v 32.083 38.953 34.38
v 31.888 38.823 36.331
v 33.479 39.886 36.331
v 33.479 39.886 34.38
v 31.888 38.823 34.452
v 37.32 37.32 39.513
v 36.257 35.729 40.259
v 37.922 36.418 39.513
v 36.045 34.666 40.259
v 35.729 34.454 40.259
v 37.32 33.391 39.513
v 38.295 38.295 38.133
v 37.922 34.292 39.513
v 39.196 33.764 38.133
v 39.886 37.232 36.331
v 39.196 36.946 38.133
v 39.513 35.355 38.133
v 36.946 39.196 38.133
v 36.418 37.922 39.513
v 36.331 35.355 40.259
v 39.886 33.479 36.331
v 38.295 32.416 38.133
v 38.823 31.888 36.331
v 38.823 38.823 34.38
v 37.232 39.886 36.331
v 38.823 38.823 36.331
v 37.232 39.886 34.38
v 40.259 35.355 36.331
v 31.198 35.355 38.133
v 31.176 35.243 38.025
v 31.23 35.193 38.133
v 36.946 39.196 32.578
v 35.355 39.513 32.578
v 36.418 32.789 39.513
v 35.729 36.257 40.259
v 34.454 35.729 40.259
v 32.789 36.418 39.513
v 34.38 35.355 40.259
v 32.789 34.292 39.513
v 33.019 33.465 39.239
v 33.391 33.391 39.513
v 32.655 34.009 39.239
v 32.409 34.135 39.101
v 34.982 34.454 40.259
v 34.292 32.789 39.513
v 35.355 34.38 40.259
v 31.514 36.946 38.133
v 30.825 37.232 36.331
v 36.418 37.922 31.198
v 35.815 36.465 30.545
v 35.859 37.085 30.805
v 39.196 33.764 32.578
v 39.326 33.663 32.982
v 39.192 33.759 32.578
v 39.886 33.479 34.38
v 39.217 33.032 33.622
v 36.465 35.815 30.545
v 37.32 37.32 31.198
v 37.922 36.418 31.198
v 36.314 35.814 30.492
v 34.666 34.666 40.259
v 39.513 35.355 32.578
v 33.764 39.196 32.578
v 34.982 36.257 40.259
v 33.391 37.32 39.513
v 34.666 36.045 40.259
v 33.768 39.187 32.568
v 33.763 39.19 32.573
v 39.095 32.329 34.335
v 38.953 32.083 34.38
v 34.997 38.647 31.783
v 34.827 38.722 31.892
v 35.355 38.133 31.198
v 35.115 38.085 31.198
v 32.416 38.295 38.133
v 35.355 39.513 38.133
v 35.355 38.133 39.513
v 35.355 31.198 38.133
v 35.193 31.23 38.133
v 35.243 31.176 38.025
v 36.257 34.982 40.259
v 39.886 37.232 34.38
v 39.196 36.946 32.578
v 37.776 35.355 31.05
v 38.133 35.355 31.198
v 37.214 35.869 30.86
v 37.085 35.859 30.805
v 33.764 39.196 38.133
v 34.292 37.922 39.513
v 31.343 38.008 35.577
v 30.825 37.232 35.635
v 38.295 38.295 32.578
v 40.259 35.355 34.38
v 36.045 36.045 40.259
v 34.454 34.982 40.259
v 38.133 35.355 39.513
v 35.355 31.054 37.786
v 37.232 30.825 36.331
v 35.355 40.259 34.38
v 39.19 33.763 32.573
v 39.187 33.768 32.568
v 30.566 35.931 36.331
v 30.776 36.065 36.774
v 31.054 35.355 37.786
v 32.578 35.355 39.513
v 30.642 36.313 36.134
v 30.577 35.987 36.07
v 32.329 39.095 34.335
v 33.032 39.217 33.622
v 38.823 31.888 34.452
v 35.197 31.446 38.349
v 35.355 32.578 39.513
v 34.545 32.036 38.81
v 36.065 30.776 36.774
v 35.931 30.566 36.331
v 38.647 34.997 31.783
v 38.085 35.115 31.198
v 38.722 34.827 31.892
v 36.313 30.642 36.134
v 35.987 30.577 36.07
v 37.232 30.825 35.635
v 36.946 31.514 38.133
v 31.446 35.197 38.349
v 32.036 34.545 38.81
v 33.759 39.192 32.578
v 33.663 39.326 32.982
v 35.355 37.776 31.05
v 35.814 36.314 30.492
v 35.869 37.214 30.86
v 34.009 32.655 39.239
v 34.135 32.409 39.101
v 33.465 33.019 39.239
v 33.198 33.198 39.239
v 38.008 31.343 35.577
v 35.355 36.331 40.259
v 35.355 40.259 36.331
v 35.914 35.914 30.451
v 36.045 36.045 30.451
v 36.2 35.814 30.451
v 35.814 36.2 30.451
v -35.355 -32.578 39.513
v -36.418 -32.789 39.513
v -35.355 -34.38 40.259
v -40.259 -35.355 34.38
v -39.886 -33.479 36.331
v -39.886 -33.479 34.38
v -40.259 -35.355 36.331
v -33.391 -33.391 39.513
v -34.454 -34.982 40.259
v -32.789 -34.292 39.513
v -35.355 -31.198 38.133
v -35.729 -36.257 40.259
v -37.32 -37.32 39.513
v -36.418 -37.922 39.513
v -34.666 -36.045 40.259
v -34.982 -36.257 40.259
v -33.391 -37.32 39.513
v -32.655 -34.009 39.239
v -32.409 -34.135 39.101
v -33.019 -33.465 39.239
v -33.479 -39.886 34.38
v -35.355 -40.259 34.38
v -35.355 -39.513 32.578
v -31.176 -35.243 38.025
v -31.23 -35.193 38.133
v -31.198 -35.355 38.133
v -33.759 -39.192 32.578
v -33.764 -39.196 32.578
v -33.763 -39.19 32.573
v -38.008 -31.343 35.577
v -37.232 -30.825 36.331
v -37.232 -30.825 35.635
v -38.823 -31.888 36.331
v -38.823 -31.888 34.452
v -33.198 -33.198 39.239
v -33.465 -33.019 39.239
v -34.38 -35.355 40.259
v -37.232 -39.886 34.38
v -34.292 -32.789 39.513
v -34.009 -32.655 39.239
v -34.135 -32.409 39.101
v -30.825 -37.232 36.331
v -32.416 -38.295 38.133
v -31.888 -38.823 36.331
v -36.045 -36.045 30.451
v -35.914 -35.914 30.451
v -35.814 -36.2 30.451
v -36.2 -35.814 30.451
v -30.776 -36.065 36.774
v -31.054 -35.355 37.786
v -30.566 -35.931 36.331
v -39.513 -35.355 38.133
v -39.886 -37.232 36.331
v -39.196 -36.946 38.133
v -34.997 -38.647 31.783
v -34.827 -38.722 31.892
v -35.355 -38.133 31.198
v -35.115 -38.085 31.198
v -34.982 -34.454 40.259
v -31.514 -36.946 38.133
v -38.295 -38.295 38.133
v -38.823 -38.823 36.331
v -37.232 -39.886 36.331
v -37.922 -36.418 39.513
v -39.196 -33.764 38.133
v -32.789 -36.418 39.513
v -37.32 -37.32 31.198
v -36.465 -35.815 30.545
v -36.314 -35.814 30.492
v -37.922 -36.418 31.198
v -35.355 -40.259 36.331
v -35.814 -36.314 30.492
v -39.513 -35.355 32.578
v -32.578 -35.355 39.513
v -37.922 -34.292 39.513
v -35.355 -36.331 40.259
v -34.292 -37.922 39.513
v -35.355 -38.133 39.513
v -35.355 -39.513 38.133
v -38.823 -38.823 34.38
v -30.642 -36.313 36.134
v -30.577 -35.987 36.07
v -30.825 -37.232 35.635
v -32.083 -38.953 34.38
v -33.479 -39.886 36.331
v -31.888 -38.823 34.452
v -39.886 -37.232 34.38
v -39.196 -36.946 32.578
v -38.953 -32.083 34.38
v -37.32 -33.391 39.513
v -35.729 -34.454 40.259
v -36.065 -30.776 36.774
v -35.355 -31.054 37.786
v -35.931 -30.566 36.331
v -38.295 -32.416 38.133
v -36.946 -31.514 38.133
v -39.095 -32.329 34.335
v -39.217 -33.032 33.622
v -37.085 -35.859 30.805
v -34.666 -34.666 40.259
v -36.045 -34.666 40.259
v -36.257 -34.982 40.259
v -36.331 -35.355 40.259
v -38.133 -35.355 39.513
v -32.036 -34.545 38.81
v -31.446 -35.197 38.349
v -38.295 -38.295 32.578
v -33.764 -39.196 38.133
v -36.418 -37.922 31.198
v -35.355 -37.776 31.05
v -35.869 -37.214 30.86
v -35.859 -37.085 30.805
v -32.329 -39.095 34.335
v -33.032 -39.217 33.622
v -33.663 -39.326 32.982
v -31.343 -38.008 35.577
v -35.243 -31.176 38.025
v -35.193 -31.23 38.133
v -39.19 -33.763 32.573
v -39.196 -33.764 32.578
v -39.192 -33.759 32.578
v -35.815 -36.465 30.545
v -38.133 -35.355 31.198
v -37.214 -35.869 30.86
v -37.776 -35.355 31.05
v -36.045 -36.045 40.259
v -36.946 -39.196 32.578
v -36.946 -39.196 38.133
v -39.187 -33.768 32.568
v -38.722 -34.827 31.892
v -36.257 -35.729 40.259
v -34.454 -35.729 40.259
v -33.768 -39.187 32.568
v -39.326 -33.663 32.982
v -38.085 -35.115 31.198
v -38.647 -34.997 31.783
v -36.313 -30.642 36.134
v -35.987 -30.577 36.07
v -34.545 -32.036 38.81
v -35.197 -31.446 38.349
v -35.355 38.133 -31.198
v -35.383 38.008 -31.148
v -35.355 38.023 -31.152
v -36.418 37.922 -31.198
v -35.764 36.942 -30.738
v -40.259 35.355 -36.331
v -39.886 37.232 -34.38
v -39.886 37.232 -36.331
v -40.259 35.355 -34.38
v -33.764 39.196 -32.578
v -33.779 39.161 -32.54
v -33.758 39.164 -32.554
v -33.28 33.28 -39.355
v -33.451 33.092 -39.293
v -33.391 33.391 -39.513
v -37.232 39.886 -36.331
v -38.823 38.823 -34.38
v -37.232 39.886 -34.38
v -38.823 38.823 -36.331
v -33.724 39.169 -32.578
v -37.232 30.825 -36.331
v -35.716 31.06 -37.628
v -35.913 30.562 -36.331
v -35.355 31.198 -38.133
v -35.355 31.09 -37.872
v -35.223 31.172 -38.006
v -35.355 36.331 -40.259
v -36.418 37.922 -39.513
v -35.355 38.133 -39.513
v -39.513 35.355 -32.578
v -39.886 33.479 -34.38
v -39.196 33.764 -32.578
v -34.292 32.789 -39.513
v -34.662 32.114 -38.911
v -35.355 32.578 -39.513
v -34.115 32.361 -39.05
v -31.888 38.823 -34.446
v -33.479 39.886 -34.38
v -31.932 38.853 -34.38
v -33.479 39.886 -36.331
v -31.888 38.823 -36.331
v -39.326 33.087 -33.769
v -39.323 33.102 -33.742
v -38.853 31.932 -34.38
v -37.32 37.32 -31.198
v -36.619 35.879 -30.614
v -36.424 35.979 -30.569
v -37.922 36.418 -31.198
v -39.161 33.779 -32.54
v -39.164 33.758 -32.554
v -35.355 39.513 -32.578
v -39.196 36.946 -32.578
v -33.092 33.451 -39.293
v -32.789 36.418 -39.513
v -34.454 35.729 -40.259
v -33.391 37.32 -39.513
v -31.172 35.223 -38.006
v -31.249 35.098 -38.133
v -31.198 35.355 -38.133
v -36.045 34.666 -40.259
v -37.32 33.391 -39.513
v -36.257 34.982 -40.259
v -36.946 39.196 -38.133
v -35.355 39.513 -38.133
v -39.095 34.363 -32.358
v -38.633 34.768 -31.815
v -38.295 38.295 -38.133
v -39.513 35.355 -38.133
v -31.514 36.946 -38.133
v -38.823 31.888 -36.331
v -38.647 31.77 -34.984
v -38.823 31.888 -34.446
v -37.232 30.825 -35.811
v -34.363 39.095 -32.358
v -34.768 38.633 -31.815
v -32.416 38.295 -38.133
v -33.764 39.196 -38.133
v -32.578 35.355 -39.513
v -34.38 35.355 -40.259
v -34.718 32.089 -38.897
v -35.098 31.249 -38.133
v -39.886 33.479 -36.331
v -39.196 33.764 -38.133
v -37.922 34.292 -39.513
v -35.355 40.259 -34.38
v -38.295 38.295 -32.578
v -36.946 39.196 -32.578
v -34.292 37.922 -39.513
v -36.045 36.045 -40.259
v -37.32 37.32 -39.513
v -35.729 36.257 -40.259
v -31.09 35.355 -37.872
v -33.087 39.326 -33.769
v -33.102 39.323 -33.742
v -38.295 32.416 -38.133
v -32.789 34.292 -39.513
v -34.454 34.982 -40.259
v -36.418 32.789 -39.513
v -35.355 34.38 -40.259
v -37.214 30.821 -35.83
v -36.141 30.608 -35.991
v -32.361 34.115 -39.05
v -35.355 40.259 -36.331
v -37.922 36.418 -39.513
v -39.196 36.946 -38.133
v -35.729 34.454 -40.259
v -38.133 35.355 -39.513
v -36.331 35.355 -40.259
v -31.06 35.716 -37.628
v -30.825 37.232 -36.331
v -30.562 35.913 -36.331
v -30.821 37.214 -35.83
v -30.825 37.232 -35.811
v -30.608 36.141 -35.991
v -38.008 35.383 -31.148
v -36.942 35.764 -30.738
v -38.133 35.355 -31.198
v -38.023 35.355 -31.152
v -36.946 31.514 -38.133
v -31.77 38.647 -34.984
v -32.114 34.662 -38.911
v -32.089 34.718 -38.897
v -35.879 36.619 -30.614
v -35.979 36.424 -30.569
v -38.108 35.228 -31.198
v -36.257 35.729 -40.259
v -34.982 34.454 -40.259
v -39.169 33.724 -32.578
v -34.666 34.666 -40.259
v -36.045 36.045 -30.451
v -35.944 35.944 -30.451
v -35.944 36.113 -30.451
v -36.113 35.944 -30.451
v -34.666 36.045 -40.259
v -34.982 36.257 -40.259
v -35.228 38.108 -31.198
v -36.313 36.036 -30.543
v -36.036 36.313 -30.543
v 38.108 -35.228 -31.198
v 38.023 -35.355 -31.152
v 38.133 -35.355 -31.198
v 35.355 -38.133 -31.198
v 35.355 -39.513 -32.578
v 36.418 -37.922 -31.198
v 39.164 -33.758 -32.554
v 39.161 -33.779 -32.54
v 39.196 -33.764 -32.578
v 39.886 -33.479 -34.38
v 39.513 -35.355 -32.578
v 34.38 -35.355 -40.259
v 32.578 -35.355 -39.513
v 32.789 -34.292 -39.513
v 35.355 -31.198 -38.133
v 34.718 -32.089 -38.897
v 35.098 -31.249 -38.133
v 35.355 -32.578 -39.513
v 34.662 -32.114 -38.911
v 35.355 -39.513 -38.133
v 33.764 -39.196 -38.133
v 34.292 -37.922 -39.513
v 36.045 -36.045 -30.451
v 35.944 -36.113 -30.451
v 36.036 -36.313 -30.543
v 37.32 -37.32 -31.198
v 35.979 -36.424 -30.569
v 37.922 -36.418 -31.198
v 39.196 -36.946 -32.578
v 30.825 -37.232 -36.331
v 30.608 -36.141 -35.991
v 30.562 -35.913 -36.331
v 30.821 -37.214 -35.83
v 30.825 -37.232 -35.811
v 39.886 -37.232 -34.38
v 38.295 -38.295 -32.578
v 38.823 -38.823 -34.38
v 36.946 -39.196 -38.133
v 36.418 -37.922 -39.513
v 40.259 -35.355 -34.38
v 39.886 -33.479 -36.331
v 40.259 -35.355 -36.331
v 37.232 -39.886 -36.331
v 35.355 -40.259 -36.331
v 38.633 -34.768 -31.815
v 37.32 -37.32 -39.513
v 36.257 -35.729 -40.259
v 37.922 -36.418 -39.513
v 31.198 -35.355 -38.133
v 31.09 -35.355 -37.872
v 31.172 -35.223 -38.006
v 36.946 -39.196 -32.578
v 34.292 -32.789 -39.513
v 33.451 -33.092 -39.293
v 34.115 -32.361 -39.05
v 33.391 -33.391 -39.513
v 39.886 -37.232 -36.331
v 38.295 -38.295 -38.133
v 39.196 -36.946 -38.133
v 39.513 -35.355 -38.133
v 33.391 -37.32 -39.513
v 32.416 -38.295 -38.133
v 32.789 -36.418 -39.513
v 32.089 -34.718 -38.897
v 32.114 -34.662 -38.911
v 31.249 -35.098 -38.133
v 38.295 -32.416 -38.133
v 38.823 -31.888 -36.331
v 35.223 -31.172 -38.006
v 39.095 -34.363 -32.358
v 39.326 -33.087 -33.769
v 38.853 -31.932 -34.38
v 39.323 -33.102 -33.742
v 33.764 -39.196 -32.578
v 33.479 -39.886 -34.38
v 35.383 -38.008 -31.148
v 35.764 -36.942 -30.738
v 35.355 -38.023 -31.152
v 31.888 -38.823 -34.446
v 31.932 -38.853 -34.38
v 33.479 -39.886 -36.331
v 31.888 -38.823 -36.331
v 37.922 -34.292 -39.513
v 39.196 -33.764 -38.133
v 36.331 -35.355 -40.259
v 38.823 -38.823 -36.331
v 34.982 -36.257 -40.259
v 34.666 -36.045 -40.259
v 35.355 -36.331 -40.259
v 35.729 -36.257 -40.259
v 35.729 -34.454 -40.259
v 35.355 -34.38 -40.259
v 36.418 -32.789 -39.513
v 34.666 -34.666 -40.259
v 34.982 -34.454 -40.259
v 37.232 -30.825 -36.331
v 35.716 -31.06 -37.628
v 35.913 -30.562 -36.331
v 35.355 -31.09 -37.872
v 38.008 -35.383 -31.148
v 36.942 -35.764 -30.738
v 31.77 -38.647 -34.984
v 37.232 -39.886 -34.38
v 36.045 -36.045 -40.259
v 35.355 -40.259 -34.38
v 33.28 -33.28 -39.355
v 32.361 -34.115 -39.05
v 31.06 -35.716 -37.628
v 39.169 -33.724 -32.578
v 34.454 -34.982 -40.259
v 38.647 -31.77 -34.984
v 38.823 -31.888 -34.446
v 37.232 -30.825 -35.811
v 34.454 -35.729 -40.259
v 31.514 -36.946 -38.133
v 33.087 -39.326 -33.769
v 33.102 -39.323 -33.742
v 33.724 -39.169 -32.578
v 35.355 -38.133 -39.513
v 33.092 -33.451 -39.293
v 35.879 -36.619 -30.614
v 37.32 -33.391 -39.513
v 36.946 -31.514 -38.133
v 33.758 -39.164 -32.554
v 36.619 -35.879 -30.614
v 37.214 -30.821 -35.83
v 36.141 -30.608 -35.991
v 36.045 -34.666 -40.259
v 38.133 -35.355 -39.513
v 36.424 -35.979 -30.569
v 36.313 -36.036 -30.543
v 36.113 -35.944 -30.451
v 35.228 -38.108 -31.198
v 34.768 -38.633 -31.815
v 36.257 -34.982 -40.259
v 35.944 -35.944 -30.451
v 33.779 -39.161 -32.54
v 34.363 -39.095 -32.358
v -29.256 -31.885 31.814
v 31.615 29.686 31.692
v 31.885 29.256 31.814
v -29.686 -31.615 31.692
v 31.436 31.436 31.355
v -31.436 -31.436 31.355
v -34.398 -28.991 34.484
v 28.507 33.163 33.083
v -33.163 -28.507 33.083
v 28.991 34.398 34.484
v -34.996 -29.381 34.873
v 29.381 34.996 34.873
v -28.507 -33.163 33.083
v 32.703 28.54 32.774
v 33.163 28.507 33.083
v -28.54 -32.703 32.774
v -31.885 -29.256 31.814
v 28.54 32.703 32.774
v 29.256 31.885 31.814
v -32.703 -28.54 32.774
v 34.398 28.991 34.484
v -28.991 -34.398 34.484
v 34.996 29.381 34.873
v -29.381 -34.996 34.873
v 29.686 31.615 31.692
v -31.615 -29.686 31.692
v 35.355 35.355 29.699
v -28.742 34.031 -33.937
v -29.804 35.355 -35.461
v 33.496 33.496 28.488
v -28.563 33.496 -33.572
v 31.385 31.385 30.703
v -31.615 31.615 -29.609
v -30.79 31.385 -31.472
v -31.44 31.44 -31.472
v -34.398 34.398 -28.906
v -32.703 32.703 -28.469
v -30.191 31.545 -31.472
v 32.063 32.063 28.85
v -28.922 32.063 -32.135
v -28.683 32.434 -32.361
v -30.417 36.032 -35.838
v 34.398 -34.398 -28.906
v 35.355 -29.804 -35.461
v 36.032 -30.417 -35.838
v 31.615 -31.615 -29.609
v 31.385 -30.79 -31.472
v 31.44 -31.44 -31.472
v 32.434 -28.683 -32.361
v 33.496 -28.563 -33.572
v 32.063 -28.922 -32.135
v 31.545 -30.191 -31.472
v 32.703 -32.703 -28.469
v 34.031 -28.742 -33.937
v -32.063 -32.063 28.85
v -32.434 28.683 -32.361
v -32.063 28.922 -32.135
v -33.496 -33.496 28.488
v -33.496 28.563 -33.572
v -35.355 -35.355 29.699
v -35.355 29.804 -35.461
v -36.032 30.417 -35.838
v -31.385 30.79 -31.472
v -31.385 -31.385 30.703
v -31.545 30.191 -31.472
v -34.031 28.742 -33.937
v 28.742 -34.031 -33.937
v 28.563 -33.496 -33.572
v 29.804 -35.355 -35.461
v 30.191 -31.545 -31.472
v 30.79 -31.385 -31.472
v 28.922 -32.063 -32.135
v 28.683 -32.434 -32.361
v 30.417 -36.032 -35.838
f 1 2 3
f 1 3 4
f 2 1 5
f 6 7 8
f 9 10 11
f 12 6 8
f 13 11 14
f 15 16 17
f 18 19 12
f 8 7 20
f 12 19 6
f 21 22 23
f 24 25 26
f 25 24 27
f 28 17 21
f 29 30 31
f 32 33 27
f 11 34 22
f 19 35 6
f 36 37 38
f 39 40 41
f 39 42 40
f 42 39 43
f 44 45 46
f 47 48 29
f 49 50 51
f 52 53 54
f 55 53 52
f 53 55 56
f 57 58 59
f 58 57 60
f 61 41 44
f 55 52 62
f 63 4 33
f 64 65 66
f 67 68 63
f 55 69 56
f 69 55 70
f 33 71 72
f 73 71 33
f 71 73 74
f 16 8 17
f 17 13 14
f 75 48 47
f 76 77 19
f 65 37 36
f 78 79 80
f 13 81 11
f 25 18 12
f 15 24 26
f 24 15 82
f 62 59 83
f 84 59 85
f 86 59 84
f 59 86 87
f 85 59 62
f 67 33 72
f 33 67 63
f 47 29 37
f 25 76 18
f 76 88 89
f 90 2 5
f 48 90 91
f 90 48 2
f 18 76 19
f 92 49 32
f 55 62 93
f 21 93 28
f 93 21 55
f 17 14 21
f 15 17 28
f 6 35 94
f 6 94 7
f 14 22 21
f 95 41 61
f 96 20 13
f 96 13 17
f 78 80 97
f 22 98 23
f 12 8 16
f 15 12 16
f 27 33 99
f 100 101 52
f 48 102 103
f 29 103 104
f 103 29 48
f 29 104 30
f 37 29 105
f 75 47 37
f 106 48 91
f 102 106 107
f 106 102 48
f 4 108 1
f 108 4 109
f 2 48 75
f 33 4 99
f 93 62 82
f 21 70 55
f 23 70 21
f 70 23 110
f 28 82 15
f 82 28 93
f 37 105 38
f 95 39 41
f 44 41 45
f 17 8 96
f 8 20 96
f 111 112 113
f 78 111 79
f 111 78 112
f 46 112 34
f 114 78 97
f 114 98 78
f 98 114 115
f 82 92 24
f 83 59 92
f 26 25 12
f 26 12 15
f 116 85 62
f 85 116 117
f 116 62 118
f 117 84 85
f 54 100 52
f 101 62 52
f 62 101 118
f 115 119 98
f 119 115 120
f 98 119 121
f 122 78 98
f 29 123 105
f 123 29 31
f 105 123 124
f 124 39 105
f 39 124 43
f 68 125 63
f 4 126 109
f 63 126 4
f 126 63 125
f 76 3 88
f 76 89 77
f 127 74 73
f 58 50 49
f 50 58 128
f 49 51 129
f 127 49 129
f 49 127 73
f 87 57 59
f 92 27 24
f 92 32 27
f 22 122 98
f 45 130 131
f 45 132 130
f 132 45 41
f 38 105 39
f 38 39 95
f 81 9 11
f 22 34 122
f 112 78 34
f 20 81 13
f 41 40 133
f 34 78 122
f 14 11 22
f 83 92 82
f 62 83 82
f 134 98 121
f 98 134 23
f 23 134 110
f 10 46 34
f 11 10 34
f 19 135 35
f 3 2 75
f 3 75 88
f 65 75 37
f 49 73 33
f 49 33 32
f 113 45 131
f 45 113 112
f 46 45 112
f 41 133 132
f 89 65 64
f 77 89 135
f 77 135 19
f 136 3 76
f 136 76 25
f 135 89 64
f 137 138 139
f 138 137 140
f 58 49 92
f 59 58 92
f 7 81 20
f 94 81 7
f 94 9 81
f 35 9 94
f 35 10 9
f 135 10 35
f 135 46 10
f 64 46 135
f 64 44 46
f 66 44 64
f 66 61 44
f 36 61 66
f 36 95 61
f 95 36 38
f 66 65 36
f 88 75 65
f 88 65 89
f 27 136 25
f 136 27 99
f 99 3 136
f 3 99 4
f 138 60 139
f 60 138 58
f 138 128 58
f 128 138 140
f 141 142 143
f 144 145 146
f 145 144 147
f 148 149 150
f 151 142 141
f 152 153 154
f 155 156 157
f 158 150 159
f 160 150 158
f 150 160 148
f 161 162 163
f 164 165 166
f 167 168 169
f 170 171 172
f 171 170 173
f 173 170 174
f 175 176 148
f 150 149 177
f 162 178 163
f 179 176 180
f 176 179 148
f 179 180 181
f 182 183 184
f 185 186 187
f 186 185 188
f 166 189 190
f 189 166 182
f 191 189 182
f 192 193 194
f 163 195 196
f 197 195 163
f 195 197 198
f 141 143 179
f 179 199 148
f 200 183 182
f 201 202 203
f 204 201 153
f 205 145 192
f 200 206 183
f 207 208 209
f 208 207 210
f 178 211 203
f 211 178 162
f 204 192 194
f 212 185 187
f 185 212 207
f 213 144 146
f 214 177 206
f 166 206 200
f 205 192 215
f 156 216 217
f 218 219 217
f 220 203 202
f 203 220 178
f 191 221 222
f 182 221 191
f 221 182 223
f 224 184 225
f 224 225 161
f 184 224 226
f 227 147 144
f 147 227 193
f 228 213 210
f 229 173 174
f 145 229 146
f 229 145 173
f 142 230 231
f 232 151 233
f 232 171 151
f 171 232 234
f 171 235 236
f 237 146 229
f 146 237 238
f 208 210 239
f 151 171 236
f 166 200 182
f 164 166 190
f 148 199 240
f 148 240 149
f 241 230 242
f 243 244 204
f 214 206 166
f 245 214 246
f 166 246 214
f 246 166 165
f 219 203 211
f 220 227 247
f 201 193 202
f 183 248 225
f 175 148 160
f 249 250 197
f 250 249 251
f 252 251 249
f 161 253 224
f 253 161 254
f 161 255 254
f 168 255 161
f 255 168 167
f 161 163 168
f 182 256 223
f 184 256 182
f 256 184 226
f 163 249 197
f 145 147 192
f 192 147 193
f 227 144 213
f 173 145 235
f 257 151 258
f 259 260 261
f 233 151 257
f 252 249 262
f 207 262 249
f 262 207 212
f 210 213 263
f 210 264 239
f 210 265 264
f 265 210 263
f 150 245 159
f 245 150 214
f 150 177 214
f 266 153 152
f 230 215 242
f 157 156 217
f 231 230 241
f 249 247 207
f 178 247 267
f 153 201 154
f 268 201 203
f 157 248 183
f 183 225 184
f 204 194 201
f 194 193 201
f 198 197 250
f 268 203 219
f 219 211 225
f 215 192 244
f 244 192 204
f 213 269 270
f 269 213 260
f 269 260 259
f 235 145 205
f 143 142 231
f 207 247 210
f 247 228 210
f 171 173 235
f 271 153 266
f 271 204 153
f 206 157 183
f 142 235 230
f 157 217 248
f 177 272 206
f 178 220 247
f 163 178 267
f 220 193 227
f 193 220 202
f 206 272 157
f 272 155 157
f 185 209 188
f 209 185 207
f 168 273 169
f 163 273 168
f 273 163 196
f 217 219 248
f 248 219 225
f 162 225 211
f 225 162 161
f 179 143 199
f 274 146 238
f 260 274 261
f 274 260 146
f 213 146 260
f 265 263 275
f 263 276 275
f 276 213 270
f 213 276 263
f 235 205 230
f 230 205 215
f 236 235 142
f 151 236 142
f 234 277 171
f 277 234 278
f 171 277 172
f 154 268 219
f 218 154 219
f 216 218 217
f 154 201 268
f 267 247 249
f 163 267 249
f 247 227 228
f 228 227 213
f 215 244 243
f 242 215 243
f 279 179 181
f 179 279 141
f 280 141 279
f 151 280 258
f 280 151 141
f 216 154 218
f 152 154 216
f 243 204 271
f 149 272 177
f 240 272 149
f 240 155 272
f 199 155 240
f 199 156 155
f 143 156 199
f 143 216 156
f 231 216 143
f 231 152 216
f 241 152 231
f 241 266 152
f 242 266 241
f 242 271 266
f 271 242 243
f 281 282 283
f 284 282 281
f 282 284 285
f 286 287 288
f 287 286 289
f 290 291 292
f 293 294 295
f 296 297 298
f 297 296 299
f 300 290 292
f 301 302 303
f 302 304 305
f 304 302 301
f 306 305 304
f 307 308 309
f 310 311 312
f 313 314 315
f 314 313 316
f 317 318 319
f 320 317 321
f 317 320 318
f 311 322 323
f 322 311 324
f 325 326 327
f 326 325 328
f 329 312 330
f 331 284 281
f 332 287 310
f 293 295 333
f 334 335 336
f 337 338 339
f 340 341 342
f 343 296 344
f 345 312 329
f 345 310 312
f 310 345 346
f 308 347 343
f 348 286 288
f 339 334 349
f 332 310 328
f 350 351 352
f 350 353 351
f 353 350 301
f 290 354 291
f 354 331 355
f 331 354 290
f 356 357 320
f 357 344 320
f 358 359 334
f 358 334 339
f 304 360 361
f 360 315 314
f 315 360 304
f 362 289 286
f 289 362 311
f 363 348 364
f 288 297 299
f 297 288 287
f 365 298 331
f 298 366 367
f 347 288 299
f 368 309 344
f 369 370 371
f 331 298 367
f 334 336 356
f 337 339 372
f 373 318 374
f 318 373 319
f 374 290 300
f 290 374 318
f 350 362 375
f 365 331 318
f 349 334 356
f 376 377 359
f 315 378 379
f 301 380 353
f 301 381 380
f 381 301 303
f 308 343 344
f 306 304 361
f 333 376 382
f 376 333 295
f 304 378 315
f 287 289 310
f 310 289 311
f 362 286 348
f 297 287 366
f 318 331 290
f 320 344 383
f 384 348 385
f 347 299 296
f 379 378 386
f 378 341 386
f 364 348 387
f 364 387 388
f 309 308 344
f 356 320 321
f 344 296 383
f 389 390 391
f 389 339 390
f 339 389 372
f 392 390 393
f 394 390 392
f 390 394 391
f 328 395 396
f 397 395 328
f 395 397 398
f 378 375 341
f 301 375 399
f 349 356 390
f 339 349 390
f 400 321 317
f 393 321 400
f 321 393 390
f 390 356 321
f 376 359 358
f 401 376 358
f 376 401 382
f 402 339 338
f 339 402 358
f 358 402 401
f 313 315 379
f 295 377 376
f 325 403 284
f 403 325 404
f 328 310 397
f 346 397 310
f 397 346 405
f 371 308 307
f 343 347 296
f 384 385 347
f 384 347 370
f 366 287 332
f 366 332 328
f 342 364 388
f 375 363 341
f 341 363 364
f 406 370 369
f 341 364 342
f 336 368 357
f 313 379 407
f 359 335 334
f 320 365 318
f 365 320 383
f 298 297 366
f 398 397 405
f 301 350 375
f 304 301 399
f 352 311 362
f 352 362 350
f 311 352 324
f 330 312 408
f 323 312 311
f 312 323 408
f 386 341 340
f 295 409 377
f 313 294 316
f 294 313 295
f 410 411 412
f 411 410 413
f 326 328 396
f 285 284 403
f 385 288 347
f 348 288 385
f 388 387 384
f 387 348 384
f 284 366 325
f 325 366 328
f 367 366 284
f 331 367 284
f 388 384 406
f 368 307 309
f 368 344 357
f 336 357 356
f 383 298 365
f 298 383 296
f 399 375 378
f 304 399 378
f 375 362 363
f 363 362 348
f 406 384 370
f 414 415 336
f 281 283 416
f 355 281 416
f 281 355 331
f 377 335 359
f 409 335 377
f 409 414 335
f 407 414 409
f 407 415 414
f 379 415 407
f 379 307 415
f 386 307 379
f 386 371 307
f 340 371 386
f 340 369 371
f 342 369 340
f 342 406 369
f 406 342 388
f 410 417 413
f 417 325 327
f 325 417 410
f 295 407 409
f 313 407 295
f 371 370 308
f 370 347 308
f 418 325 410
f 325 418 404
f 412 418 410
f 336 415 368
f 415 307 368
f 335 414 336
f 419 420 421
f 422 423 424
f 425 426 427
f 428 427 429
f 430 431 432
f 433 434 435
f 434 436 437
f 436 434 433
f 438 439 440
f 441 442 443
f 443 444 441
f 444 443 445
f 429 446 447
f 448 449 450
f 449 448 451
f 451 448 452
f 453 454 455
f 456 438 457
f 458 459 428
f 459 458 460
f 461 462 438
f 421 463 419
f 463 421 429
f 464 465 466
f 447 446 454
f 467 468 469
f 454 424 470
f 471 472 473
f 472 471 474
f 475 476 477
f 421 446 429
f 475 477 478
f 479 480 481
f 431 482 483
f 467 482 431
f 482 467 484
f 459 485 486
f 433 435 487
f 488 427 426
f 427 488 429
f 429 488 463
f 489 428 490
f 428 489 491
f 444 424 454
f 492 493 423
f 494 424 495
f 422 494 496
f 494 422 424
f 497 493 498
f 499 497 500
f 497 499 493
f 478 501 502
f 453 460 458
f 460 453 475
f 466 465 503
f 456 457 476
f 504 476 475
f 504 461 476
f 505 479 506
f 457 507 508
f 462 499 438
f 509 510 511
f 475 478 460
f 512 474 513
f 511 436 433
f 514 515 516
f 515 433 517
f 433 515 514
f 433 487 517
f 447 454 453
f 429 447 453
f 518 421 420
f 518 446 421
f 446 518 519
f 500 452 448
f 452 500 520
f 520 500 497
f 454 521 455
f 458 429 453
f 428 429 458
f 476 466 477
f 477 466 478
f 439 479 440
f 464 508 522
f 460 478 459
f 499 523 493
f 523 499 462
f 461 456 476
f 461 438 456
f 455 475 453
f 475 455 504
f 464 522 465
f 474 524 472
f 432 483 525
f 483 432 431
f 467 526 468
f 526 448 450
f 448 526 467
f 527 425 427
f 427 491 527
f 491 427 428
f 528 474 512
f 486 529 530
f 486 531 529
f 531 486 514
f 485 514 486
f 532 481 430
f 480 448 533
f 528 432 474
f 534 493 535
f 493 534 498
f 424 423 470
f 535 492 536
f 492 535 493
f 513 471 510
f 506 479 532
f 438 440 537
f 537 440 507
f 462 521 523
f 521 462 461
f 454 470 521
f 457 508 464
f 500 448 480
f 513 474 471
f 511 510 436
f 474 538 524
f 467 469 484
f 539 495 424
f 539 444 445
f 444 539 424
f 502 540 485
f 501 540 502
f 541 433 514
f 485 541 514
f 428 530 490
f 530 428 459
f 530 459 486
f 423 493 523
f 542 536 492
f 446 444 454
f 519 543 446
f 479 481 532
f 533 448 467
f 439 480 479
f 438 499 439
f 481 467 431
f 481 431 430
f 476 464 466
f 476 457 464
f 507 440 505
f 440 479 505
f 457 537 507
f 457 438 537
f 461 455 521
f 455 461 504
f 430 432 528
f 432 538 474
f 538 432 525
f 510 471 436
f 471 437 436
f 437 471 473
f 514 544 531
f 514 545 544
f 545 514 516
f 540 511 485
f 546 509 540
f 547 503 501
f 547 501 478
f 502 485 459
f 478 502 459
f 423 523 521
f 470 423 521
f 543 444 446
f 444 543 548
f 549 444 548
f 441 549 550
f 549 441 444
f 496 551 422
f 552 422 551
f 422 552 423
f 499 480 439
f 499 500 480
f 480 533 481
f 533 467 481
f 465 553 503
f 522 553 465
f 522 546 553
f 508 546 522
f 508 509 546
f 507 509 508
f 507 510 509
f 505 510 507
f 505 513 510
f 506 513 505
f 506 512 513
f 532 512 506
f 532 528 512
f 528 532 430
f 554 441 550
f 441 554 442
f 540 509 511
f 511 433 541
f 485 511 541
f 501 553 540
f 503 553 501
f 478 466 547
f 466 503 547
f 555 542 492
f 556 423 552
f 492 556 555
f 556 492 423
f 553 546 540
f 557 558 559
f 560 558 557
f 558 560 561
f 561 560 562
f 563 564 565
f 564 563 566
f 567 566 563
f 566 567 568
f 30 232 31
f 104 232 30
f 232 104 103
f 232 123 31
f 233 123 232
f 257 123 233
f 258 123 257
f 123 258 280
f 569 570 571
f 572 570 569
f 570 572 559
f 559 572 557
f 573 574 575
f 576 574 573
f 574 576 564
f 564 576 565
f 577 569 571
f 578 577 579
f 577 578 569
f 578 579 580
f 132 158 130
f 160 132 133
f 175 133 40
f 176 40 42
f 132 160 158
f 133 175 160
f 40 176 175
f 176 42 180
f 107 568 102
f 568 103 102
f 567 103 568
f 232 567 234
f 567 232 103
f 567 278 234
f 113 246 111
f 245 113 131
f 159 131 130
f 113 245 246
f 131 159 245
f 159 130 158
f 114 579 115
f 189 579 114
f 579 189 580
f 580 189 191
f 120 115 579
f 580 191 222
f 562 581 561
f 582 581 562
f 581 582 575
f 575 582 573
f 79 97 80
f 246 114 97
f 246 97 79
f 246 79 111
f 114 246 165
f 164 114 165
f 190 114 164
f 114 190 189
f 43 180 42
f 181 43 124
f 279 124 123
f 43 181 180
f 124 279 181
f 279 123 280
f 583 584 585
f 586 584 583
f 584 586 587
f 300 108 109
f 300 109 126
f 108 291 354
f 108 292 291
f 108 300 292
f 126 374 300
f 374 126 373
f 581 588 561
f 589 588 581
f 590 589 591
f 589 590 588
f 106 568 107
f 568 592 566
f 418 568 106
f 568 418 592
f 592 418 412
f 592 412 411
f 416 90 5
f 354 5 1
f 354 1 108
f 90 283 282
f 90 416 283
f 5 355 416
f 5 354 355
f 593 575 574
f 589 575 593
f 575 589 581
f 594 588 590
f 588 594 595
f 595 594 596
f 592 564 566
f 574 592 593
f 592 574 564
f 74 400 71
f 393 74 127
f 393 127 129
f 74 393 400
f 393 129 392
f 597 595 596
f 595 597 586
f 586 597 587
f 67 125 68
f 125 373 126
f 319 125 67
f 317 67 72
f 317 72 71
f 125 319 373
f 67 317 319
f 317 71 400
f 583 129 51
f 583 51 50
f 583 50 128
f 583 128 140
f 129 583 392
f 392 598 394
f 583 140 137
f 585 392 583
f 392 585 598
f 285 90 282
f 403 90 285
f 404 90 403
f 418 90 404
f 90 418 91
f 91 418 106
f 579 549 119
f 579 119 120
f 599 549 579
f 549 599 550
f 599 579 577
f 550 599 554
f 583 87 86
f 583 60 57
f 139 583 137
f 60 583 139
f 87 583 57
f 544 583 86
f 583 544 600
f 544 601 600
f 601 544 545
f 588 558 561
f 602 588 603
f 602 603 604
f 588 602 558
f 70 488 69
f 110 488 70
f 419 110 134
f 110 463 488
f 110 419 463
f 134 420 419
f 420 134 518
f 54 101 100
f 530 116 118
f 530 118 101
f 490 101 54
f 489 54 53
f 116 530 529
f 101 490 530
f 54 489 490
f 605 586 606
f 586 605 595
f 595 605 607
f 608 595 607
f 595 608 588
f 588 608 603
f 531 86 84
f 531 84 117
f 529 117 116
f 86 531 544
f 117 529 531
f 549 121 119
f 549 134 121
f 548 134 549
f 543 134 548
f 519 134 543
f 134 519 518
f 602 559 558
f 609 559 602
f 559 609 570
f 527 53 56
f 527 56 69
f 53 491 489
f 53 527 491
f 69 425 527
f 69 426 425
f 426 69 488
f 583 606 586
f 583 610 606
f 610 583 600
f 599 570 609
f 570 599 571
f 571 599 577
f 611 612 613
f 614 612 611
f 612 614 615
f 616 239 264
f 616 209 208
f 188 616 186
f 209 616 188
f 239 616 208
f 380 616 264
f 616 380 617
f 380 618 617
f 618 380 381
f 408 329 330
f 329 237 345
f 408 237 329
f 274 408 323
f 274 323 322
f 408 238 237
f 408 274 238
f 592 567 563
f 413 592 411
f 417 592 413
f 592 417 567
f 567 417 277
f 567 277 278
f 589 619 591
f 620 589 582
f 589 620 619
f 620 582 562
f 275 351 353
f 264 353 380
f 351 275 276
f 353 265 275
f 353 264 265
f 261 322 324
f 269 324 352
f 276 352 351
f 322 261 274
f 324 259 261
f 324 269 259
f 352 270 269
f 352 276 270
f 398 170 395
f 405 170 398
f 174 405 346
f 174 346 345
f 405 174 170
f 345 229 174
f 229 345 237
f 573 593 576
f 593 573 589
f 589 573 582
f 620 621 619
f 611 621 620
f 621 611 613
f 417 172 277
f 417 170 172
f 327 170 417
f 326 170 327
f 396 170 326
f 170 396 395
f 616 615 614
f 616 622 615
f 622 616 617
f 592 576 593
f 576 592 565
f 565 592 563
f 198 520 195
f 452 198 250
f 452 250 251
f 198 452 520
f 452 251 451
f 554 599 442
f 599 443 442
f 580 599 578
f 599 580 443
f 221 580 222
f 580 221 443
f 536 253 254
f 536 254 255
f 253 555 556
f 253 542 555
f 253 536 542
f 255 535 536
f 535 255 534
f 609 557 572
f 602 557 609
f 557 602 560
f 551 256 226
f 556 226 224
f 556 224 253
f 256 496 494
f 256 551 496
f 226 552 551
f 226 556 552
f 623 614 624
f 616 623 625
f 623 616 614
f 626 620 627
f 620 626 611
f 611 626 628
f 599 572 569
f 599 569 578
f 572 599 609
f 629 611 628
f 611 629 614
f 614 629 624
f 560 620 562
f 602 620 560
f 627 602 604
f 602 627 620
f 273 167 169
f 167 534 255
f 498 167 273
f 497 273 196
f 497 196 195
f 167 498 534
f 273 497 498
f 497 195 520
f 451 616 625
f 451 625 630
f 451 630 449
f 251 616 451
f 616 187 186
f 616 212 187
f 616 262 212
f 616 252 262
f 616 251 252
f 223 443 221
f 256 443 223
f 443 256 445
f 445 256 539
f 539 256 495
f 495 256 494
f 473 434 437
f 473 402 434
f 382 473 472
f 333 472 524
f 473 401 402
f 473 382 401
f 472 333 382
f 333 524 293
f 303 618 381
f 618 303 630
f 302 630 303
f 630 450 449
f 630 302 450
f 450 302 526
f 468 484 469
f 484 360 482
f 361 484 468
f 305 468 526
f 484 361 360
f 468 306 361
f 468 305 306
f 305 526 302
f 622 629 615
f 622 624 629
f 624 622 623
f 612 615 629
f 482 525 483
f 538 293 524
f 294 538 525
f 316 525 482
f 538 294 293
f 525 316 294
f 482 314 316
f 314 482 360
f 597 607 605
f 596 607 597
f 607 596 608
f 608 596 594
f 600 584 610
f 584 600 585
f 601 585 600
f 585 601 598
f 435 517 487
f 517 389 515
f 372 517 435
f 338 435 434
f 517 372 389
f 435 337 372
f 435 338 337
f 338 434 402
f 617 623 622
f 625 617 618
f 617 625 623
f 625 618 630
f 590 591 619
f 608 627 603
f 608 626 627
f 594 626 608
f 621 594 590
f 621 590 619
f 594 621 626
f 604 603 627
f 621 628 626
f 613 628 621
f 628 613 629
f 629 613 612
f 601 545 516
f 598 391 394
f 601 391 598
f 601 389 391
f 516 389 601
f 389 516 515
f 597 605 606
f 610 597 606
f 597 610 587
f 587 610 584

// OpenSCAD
// dots1.scad
// Ron Hale-Evans
// Convert Karl Erickson's "dots" output to OpenSCAD
// Test

x=0;
y=1;
z=2;
d=35.3553742;

module strut (v0, v1)
{
    length = norm(v1-v0); // radial distance  
    b = acos((v1[z]-v0[z])/length);       // inclination angle
    c = atan2(v1[y]-v0[y],v1[x]-v0[x]);     // azimuthal angle

    translate(v0)
        rotate([0, b, c]) 
            cylinder(h=length, r=4);
    %cube(v1); // corner of cube should coincide with end of cylinder
}

p0 = [d, d, d]; // coordinates of point 0
p1 = [-d, -d, d]; // coordinates of point 1
p2 = [-d, d, -d]; // coordinates of point 2
p3 = [d, -d, -d]; // coordinates of point 3

union()
{
    translate (p0) sphere (r=5); //0
    translate (p1) sphere (r=5); //1
    translate (p2) sphere (r=5); //2
    translate (p3) sphere (r=5); //3
    
    strut(p0, p1);
    strut(p0, p2);
    strut(p0, p3);
    strut(p1, p2);
    strut(p1, p3);
    strut(p2, p3);
}
